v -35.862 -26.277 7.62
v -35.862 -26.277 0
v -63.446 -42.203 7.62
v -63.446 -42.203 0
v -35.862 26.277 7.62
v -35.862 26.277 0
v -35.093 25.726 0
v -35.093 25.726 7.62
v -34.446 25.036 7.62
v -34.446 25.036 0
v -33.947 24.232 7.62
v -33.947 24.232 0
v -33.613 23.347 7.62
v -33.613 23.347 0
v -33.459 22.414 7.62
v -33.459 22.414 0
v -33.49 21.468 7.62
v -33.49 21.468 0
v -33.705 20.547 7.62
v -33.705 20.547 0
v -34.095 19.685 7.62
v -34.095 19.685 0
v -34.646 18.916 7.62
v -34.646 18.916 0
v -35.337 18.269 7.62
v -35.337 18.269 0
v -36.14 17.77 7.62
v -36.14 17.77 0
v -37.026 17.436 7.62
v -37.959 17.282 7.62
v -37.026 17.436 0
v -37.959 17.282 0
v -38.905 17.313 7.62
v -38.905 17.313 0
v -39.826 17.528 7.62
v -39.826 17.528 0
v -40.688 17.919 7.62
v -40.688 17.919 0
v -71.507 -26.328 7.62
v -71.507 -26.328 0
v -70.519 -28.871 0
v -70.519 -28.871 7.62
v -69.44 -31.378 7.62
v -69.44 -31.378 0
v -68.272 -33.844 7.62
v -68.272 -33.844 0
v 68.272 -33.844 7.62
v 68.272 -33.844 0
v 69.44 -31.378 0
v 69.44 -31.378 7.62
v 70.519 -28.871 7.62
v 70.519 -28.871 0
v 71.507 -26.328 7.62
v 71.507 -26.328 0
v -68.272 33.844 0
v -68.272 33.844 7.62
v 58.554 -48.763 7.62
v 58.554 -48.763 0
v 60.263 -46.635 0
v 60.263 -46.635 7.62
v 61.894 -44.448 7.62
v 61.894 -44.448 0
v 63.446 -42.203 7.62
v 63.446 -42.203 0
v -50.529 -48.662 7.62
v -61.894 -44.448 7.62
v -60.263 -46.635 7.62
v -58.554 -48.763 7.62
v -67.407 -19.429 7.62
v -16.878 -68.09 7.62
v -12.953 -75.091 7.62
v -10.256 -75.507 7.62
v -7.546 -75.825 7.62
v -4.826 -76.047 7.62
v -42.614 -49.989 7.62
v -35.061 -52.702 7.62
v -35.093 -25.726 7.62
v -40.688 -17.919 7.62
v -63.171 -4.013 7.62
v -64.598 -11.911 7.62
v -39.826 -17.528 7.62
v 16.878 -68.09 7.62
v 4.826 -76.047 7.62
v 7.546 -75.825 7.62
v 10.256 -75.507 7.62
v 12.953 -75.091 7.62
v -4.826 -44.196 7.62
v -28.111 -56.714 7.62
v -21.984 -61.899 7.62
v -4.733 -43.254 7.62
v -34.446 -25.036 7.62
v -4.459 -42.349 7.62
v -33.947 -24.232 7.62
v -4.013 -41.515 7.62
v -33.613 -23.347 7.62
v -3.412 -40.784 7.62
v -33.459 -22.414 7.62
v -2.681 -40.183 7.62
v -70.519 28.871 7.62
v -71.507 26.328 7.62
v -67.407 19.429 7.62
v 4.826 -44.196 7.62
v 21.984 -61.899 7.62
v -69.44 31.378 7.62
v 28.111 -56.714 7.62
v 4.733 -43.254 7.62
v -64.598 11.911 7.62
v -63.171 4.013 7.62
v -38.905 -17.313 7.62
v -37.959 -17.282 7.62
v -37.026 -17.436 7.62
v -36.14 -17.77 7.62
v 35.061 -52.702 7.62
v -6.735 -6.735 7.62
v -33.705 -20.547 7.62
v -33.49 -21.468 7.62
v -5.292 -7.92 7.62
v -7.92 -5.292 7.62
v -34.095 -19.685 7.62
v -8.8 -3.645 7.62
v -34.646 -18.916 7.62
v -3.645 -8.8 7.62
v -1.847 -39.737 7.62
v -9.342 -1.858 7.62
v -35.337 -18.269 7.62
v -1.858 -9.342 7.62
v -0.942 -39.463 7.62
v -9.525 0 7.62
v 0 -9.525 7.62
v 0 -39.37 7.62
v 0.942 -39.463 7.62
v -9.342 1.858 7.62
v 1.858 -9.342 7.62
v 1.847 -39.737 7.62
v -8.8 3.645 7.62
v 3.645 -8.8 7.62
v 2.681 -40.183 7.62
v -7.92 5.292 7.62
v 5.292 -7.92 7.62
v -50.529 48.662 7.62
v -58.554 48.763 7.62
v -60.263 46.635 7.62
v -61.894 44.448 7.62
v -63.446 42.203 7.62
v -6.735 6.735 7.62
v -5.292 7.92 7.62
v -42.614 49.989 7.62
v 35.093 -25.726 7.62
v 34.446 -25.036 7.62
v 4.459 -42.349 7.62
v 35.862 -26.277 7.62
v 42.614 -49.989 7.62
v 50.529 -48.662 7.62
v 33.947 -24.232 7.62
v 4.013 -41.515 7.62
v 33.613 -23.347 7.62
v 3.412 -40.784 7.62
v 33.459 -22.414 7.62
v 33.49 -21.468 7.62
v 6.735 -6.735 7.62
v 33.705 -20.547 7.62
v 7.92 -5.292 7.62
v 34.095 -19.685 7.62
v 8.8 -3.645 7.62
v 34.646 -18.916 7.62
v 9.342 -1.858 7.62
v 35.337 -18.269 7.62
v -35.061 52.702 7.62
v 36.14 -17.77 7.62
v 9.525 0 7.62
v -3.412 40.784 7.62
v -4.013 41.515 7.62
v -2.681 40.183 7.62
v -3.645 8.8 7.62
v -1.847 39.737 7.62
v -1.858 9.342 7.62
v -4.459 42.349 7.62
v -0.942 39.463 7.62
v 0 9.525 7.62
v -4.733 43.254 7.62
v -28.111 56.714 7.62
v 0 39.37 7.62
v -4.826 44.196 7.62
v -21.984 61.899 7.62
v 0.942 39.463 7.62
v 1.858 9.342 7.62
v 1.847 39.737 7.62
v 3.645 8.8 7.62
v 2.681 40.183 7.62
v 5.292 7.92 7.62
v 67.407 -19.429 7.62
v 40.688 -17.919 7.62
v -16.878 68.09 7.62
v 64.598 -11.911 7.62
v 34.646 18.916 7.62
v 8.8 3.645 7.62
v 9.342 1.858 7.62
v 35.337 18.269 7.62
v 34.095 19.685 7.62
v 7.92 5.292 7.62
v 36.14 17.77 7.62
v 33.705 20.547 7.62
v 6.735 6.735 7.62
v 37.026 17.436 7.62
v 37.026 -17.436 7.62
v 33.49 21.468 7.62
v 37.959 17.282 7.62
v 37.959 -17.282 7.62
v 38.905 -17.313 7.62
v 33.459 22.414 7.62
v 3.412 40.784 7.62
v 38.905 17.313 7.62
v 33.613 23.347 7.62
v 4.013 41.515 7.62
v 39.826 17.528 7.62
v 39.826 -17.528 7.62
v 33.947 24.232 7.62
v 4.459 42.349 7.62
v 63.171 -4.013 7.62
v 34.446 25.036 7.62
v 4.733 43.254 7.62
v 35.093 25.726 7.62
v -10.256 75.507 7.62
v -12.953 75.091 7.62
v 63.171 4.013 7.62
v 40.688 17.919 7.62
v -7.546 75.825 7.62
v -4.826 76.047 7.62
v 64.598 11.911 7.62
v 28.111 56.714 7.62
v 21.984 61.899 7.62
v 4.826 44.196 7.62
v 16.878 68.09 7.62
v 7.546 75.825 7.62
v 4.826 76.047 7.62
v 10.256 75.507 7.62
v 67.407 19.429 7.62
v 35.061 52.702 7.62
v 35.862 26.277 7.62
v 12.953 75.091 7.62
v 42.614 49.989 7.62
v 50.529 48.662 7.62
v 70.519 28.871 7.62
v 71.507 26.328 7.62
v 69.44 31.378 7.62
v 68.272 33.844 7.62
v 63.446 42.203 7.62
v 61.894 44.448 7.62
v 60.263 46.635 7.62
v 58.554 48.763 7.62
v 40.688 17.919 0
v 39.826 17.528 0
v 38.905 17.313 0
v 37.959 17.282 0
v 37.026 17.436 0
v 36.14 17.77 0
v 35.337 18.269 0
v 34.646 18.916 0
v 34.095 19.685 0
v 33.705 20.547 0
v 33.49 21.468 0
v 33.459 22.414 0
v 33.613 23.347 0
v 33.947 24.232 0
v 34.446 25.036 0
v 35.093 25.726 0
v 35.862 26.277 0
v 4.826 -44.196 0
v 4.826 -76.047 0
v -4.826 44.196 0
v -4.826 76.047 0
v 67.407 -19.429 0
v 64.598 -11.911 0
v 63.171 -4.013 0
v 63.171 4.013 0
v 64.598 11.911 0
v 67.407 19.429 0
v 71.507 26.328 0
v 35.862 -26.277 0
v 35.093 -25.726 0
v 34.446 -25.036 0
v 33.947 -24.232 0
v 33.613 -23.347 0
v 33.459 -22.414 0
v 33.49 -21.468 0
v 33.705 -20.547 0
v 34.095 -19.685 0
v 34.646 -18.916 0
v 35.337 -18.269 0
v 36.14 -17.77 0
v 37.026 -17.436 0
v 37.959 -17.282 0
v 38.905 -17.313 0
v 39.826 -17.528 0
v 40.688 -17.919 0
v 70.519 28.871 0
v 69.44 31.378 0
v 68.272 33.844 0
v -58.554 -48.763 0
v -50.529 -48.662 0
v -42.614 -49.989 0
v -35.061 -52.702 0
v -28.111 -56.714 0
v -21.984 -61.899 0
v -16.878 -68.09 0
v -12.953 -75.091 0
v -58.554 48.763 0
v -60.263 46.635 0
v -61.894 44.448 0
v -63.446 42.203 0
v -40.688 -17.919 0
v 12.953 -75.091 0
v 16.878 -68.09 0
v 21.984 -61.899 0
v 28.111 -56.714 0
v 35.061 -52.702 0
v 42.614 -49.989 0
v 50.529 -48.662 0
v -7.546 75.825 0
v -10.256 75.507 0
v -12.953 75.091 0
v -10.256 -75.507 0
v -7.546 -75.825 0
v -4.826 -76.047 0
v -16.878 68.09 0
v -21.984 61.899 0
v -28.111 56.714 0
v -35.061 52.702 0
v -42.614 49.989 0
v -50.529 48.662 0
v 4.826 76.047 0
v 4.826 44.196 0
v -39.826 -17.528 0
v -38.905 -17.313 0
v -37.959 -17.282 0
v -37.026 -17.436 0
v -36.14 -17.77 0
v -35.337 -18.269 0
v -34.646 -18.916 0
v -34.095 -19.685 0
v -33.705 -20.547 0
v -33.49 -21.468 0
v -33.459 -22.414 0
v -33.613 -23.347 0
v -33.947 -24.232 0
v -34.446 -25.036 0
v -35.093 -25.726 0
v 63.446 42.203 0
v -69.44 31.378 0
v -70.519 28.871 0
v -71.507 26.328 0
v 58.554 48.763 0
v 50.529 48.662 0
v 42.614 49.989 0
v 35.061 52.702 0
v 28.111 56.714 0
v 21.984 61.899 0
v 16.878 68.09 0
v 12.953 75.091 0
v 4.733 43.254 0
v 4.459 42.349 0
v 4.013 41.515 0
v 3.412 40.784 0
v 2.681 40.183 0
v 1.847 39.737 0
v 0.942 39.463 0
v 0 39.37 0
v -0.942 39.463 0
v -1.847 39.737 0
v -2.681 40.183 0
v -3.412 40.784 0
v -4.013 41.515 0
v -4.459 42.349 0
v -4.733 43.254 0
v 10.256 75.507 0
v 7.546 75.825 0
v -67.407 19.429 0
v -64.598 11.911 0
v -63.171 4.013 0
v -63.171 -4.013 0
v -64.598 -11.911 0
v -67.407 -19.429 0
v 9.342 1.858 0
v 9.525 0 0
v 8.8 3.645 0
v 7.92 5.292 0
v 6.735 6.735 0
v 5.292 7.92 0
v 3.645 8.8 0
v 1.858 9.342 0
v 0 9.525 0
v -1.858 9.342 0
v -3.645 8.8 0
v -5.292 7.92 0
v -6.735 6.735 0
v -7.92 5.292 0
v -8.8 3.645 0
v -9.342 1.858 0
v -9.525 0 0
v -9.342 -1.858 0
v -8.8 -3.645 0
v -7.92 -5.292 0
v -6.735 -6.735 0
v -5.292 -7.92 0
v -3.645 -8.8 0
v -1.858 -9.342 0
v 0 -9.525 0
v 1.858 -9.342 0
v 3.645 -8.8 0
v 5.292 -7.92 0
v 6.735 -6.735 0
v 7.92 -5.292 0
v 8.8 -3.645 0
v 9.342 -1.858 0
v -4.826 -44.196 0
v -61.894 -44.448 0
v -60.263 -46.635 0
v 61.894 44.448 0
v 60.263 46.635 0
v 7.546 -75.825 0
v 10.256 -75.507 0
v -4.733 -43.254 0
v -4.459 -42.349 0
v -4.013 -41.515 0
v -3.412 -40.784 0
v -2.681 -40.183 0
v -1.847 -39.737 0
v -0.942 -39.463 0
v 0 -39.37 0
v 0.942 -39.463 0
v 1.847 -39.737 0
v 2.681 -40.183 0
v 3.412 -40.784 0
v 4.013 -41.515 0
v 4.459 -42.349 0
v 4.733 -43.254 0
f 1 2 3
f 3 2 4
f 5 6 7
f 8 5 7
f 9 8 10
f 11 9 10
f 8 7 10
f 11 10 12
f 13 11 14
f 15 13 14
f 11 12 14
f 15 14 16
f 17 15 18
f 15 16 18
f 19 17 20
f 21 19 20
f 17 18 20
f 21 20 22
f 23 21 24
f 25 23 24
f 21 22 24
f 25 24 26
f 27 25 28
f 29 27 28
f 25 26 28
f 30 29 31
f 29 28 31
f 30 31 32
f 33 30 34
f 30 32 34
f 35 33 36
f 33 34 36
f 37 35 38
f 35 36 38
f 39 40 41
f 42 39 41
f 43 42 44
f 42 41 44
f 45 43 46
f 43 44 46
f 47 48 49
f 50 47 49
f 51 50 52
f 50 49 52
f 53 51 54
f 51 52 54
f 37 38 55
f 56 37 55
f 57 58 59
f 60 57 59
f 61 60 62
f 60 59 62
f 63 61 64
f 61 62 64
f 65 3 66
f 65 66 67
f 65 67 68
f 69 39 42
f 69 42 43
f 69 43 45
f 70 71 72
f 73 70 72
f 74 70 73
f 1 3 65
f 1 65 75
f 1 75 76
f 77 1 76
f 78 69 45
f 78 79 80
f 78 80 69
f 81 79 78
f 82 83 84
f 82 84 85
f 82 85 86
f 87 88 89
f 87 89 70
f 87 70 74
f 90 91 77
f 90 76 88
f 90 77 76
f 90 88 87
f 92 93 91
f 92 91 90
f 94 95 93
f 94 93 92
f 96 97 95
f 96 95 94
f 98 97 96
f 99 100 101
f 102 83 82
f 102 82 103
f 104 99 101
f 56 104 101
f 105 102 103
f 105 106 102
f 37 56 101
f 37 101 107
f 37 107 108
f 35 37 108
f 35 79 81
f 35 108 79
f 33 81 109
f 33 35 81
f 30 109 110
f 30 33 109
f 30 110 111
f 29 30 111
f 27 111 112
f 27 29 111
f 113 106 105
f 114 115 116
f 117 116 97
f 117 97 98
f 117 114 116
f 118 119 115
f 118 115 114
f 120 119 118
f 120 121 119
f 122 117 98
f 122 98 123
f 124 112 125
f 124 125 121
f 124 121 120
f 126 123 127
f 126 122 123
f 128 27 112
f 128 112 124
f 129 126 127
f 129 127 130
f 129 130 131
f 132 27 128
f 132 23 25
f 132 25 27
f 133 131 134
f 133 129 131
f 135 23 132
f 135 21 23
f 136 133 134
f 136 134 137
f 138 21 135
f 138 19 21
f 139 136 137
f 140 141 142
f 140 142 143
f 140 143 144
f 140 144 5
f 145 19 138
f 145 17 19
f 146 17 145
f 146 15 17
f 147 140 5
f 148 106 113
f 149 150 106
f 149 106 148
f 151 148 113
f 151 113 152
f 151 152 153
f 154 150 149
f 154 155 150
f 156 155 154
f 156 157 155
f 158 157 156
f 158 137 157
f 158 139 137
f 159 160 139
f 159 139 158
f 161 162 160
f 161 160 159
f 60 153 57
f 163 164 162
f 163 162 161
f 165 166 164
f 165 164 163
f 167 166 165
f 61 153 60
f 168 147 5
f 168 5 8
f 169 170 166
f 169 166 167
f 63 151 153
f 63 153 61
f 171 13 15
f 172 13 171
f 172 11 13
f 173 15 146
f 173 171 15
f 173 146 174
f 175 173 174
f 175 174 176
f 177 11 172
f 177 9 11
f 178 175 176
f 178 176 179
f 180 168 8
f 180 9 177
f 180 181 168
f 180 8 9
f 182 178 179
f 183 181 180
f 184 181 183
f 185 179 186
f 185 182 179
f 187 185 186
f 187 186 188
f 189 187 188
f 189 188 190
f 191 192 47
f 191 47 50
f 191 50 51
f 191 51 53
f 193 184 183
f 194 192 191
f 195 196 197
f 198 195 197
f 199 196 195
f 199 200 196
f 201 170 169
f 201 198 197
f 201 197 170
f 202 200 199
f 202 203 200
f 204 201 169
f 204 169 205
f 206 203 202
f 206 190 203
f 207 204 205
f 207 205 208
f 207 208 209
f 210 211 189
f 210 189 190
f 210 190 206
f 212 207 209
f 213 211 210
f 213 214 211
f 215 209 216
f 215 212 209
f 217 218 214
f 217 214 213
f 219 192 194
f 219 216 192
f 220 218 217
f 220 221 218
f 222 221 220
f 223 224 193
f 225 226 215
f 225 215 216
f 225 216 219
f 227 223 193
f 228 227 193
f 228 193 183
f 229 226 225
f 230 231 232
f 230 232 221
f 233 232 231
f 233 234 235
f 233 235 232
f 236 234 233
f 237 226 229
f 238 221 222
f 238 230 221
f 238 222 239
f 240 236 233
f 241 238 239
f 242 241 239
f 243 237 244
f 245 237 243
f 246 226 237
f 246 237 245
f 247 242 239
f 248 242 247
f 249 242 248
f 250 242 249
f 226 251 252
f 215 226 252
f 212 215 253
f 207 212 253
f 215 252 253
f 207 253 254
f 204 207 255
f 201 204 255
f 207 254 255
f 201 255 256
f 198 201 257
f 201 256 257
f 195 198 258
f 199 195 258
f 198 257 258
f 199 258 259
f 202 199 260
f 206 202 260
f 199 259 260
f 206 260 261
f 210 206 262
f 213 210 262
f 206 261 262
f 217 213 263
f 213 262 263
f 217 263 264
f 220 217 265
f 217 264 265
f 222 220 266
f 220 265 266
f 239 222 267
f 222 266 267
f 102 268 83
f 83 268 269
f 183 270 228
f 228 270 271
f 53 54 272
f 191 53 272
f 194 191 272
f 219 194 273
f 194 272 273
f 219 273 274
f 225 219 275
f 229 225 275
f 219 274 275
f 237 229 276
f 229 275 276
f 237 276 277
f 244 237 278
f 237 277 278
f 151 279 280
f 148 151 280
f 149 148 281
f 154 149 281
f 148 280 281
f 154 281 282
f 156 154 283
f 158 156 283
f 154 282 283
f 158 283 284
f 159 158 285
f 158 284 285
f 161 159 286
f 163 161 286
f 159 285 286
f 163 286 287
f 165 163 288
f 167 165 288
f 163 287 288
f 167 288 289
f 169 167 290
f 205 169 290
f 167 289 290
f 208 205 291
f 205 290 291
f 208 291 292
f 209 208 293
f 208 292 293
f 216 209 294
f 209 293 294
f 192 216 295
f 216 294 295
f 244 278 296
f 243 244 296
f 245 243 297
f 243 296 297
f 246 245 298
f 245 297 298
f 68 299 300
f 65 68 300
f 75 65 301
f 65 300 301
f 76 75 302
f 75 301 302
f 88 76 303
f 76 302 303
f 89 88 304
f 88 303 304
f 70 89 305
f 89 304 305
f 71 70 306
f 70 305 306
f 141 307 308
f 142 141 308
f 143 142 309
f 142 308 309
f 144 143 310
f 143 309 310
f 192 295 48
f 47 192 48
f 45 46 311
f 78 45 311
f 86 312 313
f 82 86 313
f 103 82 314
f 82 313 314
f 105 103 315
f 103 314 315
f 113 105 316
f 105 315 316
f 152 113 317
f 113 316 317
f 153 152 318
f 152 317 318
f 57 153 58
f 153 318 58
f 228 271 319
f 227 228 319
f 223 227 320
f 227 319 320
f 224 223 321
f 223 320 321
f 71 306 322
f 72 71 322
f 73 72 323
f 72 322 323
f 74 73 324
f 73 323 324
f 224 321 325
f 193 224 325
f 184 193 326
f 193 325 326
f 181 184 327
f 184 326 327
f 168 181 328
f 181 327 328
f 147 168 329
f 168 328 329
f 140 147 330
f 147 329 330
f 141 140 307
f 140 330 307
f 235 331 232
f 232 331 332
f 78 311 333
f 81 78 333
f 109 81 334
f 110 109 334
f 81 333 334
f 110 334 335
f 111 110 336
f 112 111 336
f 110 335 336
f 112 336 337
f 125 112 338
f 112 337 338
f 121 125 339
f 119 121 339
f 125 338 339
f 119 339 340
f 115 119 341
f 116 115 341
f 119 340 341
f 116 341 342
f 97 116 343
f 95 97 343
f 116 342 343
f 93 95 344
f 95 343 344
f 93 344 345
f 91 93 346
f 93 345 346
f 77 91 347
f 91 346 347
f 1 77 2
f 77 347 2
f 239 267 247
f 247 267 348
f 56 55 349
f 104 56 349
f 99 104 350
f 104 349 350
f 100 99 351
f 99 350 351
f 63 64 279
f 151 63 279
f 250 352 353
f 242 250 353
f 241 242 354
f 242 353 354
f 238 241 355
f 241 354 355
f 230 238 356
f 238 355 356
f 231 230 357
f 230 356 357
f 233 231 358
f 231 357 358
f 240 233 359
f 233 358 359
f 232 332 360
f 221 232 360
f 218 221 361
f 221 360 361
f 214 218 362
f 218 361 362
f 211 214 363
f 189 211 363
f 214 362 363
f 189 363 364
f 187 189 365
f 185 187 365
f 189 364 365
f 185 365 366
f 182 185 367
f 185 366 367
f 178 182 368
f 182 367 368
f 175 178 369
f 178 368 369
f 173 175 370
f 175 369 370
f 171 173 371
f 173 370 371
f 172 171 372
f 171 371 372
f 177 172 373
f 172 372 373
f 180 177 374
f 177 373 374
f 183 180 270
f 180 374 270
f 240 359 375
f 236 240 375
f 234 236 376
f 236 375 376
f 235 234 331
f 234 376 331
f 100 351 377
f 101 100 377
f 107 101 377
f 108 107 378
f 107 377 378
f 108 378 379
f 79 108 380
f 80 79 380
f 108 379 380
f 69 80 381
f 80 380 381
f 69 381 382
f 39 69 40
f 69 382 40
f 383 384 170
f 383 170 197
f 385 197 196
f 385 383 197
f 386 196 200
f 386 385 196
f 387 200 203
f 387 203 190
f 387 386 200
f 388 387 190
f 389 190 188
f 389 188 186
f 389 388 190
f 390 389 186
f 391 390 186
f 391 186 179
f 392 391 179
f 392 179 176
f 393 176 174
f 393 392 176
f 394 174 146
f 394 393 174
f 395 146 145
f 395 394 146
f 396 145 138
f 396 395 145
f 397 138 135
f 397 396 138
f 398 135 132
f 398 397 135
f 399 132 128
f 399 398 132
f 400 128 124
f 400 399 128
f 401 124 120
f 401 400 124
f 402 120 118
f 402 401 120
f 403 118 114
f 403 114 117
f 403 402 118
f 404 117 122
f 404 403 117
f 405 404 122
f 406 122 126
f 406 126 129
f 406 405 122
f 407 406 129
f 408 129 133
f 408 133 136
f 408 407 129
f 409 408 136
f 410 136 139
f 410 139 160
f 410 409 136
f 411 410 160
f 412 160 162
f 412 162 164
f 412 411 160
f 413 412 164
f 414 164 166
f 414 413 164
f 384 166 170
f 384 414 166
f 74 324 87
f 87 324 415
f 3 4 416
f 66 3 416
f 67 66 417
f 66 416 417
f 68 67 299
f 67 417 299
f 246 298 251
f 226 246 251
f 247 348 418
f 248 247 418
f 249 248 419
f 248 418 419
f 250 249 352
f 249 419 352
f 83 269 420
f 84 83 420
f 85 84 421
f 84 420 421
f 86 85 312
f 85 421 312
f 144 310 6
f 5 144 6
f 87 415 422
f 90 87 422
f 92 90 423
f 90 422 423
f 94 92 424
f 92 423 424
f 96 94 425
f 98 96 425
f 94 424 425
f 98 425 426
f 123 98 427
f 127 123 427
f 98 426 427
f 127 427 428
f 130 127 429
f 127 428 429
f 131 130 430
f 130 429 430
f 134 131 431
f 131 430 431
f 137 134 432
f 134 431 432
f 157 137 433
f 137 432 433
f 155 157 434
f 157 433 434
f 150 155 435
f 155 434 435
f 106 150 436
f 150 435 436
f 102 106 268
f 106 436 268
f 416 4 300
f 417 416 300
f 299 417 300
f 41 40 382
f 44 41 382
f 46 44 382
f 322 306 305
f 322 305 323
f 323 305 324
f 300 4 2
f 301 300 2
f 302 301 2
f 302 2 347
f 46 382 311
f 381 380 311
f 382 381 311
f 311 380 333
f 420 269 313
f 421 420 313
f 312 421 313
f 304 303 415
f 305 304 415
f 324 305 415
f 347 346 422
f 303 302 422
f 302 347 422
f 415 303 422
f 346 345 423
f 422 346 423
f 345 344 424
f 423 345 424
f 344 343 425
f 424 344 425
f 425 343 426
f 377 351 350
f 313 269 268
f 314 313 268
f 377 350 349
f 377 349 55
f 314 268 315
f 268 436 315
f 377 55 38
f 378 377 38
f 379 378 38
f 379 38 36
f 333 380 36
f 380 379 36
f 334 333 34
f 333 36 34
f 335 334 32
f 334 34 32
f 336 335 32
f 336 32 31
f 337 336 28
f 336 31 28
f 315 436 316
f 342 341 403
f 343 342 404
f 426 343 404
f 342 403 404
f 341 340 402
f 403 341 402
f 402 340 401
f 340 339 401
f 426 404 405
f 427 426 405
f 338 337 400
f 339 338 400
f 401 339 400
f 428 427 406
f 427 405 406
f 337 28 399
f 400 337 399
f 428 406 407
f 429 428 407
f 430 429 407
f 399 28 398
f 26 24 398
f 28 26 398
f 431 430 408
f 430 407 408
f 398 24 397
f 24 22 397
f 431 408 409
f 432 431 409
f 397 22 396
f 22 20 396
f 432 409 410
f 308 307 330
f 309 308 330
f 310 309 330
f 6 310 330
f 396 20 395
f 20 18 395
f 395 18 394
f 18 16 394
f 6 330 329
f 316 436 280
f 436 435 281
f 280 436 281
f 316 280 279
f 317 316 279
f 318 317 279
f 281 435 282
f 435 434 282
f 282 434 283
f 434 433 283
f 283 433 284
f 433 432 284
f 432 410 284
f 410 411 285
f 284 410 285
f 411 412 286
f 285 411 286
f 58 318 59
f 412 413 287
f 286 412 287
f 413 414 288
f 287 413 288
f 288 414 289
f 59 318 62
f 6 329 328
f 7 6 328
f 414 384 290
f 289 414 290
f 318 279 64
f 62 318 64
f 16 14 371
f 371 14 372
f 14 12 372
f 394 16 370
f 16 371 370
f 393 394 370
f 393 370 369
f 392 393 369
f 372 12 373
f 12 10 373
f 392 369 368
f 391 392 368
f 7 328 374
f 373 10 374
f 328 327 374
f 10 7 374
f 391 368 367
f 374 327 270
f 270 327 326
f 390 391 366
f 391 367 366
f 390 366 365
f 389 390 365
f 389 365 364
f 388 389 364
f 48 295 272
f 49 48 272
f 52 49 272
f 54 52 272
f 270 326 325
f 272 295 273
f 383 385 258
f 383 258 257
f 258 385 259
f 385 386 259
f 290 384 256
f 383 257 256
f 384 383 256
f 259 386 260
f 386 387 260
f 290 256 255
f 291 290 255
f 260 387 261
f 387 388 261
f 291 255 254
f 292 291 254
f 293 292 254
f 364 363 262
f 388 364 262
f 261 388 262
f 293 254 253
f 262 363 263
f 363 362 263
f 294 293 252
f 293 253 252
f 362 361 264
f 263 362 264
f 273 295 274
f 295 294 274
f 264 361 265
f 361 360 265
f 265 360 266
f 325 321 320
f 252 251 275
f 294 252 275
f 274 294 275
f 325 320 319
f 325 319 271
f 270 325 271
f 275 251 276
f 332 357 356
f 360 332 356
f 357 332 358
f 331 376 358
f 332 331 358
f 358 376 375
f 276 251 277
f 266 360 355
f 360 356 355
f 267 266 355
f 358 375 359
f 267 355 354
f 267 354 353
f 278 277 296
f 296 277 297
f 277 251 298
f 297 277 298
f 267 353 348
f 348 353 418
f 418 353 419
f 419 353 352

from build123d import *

# Parameters (mm, degrees)
F0_R     = 9.525
F1_DEPTH = 7.62


with BuildPart() as f1:
    # F0 (on Top) → F1 (new body)
    with BuildSketch(Plane.XY):
        with BuildLine():
            ThreePointArc((71.507275, -26.327734), (62.992, 0), (71.507275, 26.327734))
            ThreePointArc((71.507275, 26.327734), (69.990436, 30.129369), (68.271654, 33.844073))
            Line((68.271654, 33.844073), (40.687859, 17.918561))
            ThreePointArc((40.687859, 17.918561), (34.09542, 19.685), (35.861859, 26.277439))
            Line((35.861859, 26.277439), (63.445654, 42.20295))
            ThreePointArc((63.445654, 42.20295), (61.088017, 45.548811), (58.554124, 48.76325))
            ThreePointArc((58.554124, 48.76325), (31.496, 54.552672), (12.953151, 75.090984))
            ThreePointArc((12.953151, 75.090984), (8.902419, 75.67818), (4.826, 76.047023))
            Line((4.826, 76.047023), (4.826, 44.196))
            ThreePointArc((4.826, 44.196), (0, 39.37), (-4.826, 44.196))
            Line((-4.826, 44.196), (-4.826, 76.047023))
            ThreePointArc((-4.826, 76.047023), (-8.902419, 75.67818), (-12.953151, 75.090984))
            ThreePointArc((-12.953151, 75.090984), (-31.496, 54.552672), (-58.554124, 48.76325))
            ThreePointArc((-58.554124, 48.76325), (-61.088017, 45.548811), (-63.445654, 42.20295))
            Line((-63.445654, 42.20295), (-35.861859, 26.277439))
            ThreePointArc((-35.861859, 26.277439), (-34.09542, 19.685), (-40.687859, 17.918561))
            Line((-40.687859, 17.918561), (-68.271654, 33.844073))
            ThreePointArc((-68.271654, 33.844073), (-69.990436, 30.129369), (-71.507275, 26.327734))
            ThreePointArc((-71.507275, 26.327734), (-62.992, 0), (-71.507275, -26.327734))
            ThreePointArc((-71.507275, -26.327734), (-69.990436, -30.129369), (-68.271654, -33.844073))
            Line((-68.271654, -33.844073), (-40.687859, -17.918561))
            ThreePointArc((-40.687859, -17.918561), (-34.09542, -19.685), (-35.861859, -26.277439))
            Line((-35.861859, -26.277439), (-63.445654, -42.20295))
            ThreePointArc((-63.445654, -42.20295), (-61.088017, -45.548811), (-58.554124, -48.76325))
            ThreePointArc((-58.554124, -48.76325), (-31.496, -54.552672), (-12.953151, -75.090984))
            ThreePointArc((-12.953151, -75.090984), (-8.902419, -75.67818), (-4.826, -76.047023))
            Line((-4.826, -76.047023), (-4.826, -44.196))
            ThreePointArc((-4.826, -44.196), (0, -39.37), (4.826, -44.196))
            Line((4.826, -44.196), (4.826, -76.047023))
            ThreePointArc((4.826, -76.047023), (8.902419, -75.67818), (12.953151, -75.090984))
            ThreePointArc((12.953151, -75.090984), (31.496, -54.552672), (58.554124, -48.76325))
            ThreePointArc((58.554124, -48.76325), (61.088017, -45.548811), (63.445654, -42.20295))
            Line((63.445654, -42.20295), (35.861859, -26.277439))
            ThreePointArc((35.861859, -26.277439), (34.09542, -19.685), (40.687859, -17.918561))
            Line((40.687859, -17.918561), (68.271654, -33.844073))
            ThreePointArc((68.271654, -33.844073), (69.990436, -30.129369), (71.507275, -26.327734))
        make_face()
        Circle(F0_R, mode=Mode.SUBTRACT)
    extrude(amount=F1_DEPTH)


solid = f1.part
